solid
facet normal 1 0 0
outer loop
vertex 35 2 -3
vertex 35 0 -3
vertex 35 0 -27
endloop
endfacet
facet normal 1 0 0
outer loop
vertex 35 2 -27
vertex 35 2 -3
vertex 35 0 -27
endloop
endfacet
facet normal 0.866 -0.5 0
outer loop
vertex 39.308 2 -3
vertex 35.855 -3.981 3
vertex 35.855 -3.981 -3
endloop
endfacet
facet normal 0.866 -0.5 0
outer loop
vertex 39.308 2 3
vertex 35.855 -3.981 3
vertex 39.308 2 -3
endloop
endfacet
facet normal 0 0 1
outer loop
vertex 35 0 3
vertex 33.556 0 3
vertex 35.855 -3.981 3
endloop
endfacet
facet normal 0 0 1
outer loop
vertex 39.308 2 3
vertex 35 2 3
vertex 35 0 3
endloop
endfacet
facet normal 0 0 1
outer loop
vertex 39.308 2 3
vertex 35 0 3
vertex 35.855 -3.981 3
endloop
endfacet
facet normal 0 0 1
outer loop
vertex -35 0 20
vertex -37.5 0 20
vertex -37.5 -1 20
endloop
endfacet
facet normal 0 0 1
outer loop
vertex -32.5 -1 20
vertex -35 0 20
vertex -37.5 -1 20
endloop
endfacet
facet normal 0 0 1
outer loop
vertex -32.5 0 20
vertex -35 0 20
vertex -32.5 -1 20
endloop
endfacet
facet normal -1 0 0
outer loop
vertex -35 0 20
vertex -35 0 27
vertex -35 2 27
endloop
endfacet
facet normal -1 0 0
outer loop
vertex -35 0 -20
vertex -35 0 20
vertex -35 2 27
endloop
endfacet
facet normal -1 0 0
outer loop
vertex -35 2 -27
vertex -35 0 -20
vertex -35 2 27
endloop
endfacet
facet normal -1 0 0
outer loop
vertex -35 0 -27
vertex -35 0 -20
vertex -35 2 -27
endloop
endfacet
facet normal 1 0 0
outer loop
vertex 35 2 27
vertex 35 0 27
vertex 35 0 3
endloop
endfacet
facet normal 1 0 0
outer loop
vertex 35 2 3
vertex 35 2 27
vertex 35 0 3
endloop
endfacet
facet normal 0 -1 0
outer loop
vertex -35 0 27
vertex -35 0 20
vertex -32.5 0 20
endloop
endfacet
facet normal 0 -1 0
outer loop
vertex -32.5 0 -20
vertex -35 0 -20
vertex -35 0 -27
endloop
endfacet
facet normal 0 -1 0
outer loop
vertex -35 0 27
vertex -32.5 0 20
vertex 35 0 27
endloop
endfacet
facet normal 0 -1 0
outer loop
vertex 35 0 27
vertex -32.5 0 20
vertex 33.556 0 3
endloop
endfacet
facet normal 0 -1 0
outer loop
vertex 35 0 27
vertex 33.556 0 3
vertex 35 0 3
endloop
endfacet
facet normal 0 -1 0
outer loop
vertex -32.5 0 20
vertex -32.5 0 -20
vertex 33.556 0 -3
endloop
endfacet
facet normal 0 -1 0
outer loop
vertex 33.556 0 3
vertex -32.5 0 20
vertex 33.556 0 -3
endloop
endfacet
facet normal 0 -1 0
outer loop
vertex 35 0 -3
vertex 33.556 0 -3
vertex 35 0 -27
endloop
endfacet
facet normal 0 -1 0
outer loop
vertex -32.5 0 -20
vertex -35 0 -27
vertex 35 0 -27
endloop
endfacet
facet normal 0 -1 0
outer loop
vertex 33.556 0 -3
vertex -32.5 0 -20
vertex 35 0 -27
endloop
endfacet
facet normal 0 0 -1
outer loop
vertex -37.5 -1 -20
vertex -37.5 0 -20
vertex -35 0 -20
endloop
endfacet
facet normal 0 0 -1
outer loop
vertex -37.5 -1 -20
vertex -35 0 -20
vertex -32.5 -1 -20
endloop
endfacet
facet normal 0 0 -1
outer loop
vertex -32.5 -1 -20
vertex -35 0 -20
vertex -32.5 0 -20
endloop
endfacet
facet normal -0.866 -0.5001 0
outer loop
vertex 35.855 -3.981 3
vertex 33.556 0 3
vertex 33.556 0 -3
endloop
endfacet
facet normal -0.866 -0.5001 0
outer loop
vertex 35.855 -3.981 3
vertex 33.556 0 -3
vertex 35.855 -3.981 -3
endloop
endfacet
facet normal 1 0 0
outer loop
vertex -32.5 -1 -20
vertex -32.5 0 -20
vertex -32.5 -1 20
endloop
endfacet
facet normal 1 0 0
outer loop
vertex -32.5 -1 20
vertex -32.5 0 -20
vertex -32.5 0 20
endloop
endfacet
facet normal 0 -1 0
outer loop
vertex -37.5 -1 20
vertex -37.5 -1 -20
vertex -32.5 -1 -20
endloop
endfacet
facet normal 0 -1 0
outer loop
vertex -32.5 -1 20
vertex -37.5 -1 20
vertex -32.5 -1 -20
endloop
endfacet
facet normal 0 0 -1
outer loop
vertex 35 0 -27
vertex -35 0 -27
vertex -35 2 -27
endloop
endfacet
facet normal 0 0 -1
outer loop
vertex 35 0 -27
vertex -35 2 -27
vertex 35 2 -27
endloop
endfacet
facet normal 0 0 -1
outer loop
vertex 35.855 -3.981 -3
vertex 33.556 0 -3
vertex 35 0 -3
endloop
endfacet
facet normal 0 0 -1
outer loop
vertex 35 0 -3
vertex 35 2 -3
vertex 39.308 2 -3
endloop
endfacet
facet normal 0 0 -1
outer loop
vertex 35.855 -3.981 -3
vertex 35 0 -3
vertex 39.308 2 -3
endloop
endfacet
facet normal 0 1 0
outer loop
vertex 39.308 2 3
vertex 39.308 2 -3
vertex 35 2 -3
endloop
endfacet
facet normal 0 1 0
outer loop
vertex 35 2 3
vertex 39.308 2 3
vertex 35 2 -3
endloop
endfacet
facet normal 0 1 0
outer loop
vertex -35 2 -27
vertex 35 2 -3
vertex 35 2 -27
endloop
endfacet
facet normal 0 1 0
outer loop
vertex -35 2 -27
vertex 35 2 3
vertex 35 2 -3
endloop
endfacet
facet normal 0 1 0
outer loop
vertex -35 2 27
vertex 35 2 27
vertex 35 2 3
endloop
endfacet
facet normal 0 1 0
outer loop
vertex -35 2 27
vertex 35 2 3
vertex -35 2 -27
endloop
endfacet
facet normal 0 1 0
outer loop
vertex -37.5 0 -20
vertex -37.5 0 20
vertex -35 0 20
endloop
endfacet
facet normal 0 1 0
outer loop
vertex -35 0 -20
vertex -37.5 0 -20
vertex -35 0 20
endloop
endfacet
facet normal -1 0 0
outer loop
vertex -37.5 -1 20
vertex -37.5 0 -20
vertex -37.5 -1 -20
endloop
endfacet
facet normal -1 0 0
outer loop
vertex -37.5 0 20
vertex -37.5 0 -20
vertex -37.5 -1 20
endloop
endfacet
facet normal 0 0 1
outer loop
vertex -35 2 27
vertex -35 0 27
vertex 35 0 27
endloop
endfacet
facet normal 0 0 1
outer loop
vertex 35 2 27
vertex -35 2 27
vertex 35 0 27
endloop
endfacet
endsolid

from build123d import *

# Parameters (mm, degrees)
SKETCH1_W           = 70
SKETCH1_H           = 54
BOSS_EXTRUDE1_DEPTH = 2
SKETCH2_W           = 5
SKETCH2_H           = 40
BOSS_EXTRUDE2_DEPTH = 1
BOSS_EXTRUDE3_START = -24
BOSS_EXTRUDE3_DEPTH = 6


with BuildPart() as part:
    # Sketch1 → Boss-Extrude1 (new body)
    with BuildSketch(Plane(origin=(0, 0, 0), x_dir=(1, 0, 0), z_dir=(0, 1, 0))):
        Rectangle(SKETCH1_W, SKETCH1_H)
    extrude(amount=BOSS_EXTRUDE1_DEPTH)

    # Sketch2 → Boss-Extrude2 (add)
    with BuildSketch(Plane.XZ):
        with Locations((-35, 0)):
            Rectangle(SKETCH2_W, SKETCH2_H)
    extrude(amount=BOSS_EXTRUDE2_DEPTH)

    # Sketch3 → Boss-Extrude3 (add)
    with BuildSketch(Plane.XY.offset(27).offset(BOSS_EXTRUDE3_START)):
        Polygon((35.85458287, -3.981493023), (39.307999477, 2), (32.401166263, 2), align=None)
    extrude(amount=-BOSS_EXTRUDE3_DEPTH)


solid = part.part
